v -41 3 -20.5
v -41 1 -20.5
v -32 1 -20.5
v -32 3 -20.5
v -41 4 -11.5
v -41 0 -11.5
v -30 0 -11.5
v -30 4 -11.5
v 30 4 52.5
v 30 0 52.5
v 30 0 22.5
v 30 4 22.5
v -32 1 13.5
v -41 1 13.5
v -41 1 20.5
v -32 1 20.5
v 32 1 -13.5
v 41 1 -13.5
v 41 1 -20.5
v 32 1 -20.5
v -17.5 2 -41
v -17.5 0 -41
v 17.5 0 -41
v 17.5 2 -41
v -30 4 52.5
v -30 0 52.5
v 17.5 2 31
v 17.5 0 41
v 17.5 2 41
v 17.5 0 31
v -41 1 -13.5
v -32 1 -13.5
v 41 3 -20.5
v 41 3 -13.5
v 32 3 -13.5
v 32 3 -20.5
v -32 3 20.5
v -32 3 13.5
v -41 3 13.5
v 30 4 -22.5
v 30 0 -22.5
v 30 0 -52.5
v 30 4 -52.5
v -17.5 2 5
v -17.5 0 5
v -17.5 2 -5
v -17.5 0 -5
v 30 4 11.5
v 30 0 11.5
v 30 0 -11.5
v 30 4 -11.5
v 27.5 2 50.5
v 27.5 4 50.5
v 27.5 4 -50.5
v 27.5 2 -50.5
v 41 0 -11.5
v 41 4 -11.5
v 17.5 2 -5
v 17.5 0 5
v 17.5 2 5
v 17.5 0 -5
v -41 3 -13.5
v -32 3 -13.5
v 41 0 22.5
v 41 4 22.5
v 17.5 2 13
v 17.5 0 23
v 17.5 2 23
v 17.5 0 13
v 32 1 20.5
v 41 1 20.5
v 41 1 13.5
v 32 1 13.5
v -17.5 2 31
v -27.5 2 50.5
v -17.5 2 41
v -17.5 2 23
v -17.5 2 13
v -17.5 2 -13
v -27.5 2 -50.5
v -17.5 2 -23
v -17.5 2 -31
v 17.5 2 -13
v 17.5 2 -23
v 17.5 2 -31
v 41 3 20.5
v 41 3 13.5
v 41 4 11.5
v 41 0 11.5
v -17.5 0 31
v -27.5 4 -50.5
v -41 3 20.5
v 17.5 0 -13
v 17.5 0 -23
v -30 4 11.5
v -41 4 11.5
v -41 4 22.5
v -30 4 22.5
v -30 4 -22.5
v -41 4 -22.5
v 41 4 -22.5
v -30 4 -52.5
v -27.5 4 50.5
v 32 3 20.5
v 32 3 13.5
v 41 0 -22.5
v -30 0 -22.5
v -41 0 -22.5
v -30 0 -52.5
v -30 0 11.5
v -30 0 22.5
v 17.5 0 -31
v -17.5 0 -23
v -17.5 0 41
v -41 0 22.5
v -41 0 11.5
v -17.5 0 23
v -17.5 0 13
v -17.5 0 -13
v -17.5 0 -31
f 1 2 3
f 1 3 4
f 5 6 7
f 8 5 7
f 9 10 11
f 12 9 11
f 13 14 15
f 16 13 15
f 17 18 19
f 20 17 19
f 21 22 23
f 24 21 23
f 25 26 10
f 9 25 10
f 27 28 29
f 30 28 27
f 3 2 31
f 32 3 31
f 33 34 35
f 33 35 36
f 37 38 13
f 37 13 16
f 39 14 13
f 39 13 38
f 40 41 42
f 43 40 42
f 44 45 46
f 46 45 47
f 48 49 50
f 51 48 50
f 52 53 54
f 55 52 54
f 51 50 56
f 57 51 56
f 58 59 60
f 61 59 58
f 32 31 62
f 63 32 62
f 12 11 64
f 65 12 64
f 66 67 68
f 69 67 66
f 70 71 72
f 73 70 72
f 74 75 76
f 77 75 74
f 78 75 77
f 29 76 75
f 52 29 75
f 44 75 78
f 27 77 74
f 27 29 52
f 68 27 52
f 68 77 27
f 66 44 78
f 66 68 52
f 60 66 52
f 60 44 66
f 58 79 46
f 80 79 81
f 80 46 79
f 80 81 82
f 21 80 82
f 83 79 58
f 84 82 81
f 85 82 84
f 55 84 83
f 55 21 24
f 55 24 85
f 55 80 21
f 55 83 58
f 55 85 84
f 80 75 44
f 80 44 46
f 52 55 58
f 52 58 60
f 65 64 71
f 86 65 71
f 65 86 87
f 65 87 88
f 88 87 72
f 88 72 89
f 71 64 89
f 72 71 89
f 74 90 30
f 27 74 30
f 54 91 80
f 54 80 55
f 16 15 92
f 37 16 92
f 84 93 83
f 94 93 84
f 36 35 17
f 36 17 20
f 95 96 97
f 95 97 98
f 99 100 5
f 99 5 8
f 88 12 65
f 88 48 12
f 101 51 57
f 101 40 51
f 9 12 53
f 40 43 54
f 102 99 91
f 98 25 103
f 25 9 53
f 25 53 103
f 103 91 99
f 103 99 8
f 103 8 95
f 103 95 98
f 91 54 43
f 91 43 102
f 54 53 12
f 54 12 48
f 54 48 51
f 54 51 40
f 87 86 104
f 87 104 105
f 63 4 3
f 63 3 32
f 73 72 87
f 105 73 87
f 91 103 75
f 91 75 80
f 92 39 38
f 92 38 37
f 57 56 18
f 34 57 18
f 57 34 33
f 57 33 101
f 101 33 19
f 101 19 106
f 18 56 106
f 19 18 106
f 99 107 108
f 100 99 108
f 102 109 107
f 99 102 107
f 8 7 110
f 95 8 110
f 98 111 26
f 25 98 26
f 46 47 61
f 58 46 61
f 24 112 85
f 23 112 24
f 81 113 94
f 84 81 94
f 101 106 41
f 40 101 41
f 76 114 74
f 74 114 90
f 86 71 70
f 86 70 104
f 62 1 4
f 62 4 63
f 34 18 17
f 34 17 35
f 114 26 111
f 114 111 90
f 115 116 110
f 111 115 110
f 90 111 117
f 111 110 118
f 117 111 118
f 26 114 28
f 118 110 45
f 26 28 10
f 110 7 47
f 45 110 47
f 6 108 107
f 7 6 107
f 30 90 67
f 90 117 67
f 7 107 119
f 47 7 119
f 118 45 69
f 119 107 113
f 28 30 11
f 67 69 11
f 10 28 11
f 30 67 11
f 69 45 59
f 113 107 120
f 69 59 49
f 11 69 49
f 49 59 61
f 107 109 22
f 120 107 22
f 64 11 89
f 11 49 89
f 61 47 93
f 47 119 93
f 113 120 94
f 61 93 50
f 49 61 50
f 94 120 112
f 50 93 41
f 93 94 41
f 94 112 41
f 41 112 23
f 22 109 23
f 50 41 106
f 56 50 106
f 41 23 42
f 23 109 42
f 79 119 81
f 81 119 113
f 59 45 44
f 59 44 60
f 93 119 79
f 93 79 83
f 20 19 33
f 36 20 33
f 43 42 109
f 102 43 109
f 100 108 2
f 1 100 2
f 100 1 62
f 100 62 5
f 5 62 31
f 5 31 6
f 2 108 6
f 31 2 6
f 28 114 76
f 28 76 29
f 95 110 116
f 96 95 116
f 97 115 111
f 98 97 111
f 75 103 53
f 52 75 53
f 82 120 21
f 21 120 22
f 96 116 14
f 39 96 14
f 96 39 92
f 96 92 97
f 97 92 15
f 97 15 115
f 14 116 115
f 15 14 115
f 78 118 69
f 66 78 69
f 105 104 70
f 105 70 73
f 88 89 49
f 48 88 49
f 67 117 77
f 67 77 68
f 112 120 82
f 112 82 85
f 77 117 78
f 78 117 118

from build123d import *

# Parameters (mm, degrees)
SALIENTE_EXTRUIR1_DEPTH = 4
CROQUIS2_W              = 55
CROQUIS2_H              = 101
CORTAR_EXTRUIR1_DEPTH   = 2
CROQUIS4_W              = 7
CROQUIS4_H              = 2
CORTAR_EXTRUIR2_DEPTH   = 9
CROQUIS6_W              = 7
CROQUIS6_H              = 2
CORTAR_EXTRUIR3_DEPTH   = 9
CROQUIS7_W              = 7
CROQUIS7_H              = 2
CORTAR_EXTRUIR4_DEPTH   = 9
CROQUIS8_W              = 7
CROQUIS8_H              = 2
CORTAR_EXTRUIR5_DEPTH   = 9
CROQUIS10_W             = 35
CROQUIS10_H             = 10
CORTAR_EXTRUIR6_DEPTH   = 5


with BuildPart() as part:
    # Croquis1 → Saliente-Extruir1 (new body)
    with BuildSketch(Plane(origin=(0, 0, 0), x_dir=(1, 0, 0), z_dir=(0, 1, 0))):
        Polygon((30, -52.5), (30, -22.5), (41, -22.5), (41, -11.5), (30, -11.5), (30, 11.5), (41, 11.5), (41, 22.5), (30, 22.5), (30, 52.5), (-30, 52.5), (-30, 22.5), (-41, 22.5), (-41, 11.5), (-30, 11.5), (-30, -11.5), (-41, -11.5), (-41, -22.5), (-30, -22.5), (-30, -52.5), align=None)
    extrude(amount=SALIENTE_EXTRUIR1_DEPTH)

    # Croquis2 → Cortar-Extruir1 (cut)
    with BuildSketch(Plane(origin=(0, 4, 0), x_dir=(1, 0, 0), z_dir=(0, 1, 0))):
        Rectangle(CROQUIS2_W, CROQUIS2_H)
    extrude(amount=-CORTAR_EXTRUIR1_DEPTH, mode=Mode.SUBTRACT)

    # Croquis4 → Cortar-Extruir2 (cut)
    with BuildSketch(Plane.ZY.offset(41)):
        with Locations((-17, 2)):
            Rectangle(CROQUIS4_W, CROQUIS4_H)
    extrude(amount=-CORTAR_EXTRUIR2_DEPTH, mode=Mode.SUBTRACT)

    # Croquis6 → Cortar-Extruir3 (cut)
    with BuildSketch(Plane.ZY.offset(41)):
        with Locations((17, 2)):
            Rectangle(CROQUIS6_W, CROQUIS6_H)
    extrude(amount=-CORTAR_EXTRUIR3_DEPTH, mode=Mode.SUBTRACT)

    # Croquis7 → Cortar-Extruir4 (cut)
    with BuildSketch(Plane(origin=(41, 0, 0), x_dir=(0, 0, -1), z_dir=(1, 0, 0))):
        with Locations((-17, 2)):
            Rectangle(CROQUIS7_W, CROQUIS7_H)
    extrude(amount=-CORTAR_EXTRUIR4_DEPTH, mode=Mode.SUBTRACT)

    # Croquis8 → Cortar-Extruir5 (cut)
    with BuildSketch(Plane(origin=(41, 0, 0), x_dir=(0, 0, -1), z_dir=(1, 0, 0))):
        with Locations((17, 2)):
            Rectangle(CROQUIS8_W, CROQUIS8_H)
    extrude(amount=-CORTAR_EXTRUIR5_DEPTH, mode=Mode.SUBTRACT)

    # Croquis10 → Cortar-Extruir6 (cut, through all)
    with BuildSketch(Plane(origin=(0, 0, 0), x_dir=(1, 0, 0), z_dir=(0, 1, 0))):
        with Locations((0, 36)):
            Rectangle(CROQUIS10_W, CROQUIS10_H)
        with Locations((0, 18)):
            Rectangle(CROQUIS10_W, CROQUIS10_H)
        Rectangle(CROQUIS10_W, CROQUIS10_H)
        with Locations((0, -18)):
            Rectangle(CROQUIS10_W, CROQUIS10_H)
        with Locations((0, -36)):
            Rectangle(CROQUIS10_W, CROQUIS10_H)
    extrude(amount=CORTAR_EXTRUIR6_DEPTH, mode=Mode.SUBTRACT)


solid = part.part
